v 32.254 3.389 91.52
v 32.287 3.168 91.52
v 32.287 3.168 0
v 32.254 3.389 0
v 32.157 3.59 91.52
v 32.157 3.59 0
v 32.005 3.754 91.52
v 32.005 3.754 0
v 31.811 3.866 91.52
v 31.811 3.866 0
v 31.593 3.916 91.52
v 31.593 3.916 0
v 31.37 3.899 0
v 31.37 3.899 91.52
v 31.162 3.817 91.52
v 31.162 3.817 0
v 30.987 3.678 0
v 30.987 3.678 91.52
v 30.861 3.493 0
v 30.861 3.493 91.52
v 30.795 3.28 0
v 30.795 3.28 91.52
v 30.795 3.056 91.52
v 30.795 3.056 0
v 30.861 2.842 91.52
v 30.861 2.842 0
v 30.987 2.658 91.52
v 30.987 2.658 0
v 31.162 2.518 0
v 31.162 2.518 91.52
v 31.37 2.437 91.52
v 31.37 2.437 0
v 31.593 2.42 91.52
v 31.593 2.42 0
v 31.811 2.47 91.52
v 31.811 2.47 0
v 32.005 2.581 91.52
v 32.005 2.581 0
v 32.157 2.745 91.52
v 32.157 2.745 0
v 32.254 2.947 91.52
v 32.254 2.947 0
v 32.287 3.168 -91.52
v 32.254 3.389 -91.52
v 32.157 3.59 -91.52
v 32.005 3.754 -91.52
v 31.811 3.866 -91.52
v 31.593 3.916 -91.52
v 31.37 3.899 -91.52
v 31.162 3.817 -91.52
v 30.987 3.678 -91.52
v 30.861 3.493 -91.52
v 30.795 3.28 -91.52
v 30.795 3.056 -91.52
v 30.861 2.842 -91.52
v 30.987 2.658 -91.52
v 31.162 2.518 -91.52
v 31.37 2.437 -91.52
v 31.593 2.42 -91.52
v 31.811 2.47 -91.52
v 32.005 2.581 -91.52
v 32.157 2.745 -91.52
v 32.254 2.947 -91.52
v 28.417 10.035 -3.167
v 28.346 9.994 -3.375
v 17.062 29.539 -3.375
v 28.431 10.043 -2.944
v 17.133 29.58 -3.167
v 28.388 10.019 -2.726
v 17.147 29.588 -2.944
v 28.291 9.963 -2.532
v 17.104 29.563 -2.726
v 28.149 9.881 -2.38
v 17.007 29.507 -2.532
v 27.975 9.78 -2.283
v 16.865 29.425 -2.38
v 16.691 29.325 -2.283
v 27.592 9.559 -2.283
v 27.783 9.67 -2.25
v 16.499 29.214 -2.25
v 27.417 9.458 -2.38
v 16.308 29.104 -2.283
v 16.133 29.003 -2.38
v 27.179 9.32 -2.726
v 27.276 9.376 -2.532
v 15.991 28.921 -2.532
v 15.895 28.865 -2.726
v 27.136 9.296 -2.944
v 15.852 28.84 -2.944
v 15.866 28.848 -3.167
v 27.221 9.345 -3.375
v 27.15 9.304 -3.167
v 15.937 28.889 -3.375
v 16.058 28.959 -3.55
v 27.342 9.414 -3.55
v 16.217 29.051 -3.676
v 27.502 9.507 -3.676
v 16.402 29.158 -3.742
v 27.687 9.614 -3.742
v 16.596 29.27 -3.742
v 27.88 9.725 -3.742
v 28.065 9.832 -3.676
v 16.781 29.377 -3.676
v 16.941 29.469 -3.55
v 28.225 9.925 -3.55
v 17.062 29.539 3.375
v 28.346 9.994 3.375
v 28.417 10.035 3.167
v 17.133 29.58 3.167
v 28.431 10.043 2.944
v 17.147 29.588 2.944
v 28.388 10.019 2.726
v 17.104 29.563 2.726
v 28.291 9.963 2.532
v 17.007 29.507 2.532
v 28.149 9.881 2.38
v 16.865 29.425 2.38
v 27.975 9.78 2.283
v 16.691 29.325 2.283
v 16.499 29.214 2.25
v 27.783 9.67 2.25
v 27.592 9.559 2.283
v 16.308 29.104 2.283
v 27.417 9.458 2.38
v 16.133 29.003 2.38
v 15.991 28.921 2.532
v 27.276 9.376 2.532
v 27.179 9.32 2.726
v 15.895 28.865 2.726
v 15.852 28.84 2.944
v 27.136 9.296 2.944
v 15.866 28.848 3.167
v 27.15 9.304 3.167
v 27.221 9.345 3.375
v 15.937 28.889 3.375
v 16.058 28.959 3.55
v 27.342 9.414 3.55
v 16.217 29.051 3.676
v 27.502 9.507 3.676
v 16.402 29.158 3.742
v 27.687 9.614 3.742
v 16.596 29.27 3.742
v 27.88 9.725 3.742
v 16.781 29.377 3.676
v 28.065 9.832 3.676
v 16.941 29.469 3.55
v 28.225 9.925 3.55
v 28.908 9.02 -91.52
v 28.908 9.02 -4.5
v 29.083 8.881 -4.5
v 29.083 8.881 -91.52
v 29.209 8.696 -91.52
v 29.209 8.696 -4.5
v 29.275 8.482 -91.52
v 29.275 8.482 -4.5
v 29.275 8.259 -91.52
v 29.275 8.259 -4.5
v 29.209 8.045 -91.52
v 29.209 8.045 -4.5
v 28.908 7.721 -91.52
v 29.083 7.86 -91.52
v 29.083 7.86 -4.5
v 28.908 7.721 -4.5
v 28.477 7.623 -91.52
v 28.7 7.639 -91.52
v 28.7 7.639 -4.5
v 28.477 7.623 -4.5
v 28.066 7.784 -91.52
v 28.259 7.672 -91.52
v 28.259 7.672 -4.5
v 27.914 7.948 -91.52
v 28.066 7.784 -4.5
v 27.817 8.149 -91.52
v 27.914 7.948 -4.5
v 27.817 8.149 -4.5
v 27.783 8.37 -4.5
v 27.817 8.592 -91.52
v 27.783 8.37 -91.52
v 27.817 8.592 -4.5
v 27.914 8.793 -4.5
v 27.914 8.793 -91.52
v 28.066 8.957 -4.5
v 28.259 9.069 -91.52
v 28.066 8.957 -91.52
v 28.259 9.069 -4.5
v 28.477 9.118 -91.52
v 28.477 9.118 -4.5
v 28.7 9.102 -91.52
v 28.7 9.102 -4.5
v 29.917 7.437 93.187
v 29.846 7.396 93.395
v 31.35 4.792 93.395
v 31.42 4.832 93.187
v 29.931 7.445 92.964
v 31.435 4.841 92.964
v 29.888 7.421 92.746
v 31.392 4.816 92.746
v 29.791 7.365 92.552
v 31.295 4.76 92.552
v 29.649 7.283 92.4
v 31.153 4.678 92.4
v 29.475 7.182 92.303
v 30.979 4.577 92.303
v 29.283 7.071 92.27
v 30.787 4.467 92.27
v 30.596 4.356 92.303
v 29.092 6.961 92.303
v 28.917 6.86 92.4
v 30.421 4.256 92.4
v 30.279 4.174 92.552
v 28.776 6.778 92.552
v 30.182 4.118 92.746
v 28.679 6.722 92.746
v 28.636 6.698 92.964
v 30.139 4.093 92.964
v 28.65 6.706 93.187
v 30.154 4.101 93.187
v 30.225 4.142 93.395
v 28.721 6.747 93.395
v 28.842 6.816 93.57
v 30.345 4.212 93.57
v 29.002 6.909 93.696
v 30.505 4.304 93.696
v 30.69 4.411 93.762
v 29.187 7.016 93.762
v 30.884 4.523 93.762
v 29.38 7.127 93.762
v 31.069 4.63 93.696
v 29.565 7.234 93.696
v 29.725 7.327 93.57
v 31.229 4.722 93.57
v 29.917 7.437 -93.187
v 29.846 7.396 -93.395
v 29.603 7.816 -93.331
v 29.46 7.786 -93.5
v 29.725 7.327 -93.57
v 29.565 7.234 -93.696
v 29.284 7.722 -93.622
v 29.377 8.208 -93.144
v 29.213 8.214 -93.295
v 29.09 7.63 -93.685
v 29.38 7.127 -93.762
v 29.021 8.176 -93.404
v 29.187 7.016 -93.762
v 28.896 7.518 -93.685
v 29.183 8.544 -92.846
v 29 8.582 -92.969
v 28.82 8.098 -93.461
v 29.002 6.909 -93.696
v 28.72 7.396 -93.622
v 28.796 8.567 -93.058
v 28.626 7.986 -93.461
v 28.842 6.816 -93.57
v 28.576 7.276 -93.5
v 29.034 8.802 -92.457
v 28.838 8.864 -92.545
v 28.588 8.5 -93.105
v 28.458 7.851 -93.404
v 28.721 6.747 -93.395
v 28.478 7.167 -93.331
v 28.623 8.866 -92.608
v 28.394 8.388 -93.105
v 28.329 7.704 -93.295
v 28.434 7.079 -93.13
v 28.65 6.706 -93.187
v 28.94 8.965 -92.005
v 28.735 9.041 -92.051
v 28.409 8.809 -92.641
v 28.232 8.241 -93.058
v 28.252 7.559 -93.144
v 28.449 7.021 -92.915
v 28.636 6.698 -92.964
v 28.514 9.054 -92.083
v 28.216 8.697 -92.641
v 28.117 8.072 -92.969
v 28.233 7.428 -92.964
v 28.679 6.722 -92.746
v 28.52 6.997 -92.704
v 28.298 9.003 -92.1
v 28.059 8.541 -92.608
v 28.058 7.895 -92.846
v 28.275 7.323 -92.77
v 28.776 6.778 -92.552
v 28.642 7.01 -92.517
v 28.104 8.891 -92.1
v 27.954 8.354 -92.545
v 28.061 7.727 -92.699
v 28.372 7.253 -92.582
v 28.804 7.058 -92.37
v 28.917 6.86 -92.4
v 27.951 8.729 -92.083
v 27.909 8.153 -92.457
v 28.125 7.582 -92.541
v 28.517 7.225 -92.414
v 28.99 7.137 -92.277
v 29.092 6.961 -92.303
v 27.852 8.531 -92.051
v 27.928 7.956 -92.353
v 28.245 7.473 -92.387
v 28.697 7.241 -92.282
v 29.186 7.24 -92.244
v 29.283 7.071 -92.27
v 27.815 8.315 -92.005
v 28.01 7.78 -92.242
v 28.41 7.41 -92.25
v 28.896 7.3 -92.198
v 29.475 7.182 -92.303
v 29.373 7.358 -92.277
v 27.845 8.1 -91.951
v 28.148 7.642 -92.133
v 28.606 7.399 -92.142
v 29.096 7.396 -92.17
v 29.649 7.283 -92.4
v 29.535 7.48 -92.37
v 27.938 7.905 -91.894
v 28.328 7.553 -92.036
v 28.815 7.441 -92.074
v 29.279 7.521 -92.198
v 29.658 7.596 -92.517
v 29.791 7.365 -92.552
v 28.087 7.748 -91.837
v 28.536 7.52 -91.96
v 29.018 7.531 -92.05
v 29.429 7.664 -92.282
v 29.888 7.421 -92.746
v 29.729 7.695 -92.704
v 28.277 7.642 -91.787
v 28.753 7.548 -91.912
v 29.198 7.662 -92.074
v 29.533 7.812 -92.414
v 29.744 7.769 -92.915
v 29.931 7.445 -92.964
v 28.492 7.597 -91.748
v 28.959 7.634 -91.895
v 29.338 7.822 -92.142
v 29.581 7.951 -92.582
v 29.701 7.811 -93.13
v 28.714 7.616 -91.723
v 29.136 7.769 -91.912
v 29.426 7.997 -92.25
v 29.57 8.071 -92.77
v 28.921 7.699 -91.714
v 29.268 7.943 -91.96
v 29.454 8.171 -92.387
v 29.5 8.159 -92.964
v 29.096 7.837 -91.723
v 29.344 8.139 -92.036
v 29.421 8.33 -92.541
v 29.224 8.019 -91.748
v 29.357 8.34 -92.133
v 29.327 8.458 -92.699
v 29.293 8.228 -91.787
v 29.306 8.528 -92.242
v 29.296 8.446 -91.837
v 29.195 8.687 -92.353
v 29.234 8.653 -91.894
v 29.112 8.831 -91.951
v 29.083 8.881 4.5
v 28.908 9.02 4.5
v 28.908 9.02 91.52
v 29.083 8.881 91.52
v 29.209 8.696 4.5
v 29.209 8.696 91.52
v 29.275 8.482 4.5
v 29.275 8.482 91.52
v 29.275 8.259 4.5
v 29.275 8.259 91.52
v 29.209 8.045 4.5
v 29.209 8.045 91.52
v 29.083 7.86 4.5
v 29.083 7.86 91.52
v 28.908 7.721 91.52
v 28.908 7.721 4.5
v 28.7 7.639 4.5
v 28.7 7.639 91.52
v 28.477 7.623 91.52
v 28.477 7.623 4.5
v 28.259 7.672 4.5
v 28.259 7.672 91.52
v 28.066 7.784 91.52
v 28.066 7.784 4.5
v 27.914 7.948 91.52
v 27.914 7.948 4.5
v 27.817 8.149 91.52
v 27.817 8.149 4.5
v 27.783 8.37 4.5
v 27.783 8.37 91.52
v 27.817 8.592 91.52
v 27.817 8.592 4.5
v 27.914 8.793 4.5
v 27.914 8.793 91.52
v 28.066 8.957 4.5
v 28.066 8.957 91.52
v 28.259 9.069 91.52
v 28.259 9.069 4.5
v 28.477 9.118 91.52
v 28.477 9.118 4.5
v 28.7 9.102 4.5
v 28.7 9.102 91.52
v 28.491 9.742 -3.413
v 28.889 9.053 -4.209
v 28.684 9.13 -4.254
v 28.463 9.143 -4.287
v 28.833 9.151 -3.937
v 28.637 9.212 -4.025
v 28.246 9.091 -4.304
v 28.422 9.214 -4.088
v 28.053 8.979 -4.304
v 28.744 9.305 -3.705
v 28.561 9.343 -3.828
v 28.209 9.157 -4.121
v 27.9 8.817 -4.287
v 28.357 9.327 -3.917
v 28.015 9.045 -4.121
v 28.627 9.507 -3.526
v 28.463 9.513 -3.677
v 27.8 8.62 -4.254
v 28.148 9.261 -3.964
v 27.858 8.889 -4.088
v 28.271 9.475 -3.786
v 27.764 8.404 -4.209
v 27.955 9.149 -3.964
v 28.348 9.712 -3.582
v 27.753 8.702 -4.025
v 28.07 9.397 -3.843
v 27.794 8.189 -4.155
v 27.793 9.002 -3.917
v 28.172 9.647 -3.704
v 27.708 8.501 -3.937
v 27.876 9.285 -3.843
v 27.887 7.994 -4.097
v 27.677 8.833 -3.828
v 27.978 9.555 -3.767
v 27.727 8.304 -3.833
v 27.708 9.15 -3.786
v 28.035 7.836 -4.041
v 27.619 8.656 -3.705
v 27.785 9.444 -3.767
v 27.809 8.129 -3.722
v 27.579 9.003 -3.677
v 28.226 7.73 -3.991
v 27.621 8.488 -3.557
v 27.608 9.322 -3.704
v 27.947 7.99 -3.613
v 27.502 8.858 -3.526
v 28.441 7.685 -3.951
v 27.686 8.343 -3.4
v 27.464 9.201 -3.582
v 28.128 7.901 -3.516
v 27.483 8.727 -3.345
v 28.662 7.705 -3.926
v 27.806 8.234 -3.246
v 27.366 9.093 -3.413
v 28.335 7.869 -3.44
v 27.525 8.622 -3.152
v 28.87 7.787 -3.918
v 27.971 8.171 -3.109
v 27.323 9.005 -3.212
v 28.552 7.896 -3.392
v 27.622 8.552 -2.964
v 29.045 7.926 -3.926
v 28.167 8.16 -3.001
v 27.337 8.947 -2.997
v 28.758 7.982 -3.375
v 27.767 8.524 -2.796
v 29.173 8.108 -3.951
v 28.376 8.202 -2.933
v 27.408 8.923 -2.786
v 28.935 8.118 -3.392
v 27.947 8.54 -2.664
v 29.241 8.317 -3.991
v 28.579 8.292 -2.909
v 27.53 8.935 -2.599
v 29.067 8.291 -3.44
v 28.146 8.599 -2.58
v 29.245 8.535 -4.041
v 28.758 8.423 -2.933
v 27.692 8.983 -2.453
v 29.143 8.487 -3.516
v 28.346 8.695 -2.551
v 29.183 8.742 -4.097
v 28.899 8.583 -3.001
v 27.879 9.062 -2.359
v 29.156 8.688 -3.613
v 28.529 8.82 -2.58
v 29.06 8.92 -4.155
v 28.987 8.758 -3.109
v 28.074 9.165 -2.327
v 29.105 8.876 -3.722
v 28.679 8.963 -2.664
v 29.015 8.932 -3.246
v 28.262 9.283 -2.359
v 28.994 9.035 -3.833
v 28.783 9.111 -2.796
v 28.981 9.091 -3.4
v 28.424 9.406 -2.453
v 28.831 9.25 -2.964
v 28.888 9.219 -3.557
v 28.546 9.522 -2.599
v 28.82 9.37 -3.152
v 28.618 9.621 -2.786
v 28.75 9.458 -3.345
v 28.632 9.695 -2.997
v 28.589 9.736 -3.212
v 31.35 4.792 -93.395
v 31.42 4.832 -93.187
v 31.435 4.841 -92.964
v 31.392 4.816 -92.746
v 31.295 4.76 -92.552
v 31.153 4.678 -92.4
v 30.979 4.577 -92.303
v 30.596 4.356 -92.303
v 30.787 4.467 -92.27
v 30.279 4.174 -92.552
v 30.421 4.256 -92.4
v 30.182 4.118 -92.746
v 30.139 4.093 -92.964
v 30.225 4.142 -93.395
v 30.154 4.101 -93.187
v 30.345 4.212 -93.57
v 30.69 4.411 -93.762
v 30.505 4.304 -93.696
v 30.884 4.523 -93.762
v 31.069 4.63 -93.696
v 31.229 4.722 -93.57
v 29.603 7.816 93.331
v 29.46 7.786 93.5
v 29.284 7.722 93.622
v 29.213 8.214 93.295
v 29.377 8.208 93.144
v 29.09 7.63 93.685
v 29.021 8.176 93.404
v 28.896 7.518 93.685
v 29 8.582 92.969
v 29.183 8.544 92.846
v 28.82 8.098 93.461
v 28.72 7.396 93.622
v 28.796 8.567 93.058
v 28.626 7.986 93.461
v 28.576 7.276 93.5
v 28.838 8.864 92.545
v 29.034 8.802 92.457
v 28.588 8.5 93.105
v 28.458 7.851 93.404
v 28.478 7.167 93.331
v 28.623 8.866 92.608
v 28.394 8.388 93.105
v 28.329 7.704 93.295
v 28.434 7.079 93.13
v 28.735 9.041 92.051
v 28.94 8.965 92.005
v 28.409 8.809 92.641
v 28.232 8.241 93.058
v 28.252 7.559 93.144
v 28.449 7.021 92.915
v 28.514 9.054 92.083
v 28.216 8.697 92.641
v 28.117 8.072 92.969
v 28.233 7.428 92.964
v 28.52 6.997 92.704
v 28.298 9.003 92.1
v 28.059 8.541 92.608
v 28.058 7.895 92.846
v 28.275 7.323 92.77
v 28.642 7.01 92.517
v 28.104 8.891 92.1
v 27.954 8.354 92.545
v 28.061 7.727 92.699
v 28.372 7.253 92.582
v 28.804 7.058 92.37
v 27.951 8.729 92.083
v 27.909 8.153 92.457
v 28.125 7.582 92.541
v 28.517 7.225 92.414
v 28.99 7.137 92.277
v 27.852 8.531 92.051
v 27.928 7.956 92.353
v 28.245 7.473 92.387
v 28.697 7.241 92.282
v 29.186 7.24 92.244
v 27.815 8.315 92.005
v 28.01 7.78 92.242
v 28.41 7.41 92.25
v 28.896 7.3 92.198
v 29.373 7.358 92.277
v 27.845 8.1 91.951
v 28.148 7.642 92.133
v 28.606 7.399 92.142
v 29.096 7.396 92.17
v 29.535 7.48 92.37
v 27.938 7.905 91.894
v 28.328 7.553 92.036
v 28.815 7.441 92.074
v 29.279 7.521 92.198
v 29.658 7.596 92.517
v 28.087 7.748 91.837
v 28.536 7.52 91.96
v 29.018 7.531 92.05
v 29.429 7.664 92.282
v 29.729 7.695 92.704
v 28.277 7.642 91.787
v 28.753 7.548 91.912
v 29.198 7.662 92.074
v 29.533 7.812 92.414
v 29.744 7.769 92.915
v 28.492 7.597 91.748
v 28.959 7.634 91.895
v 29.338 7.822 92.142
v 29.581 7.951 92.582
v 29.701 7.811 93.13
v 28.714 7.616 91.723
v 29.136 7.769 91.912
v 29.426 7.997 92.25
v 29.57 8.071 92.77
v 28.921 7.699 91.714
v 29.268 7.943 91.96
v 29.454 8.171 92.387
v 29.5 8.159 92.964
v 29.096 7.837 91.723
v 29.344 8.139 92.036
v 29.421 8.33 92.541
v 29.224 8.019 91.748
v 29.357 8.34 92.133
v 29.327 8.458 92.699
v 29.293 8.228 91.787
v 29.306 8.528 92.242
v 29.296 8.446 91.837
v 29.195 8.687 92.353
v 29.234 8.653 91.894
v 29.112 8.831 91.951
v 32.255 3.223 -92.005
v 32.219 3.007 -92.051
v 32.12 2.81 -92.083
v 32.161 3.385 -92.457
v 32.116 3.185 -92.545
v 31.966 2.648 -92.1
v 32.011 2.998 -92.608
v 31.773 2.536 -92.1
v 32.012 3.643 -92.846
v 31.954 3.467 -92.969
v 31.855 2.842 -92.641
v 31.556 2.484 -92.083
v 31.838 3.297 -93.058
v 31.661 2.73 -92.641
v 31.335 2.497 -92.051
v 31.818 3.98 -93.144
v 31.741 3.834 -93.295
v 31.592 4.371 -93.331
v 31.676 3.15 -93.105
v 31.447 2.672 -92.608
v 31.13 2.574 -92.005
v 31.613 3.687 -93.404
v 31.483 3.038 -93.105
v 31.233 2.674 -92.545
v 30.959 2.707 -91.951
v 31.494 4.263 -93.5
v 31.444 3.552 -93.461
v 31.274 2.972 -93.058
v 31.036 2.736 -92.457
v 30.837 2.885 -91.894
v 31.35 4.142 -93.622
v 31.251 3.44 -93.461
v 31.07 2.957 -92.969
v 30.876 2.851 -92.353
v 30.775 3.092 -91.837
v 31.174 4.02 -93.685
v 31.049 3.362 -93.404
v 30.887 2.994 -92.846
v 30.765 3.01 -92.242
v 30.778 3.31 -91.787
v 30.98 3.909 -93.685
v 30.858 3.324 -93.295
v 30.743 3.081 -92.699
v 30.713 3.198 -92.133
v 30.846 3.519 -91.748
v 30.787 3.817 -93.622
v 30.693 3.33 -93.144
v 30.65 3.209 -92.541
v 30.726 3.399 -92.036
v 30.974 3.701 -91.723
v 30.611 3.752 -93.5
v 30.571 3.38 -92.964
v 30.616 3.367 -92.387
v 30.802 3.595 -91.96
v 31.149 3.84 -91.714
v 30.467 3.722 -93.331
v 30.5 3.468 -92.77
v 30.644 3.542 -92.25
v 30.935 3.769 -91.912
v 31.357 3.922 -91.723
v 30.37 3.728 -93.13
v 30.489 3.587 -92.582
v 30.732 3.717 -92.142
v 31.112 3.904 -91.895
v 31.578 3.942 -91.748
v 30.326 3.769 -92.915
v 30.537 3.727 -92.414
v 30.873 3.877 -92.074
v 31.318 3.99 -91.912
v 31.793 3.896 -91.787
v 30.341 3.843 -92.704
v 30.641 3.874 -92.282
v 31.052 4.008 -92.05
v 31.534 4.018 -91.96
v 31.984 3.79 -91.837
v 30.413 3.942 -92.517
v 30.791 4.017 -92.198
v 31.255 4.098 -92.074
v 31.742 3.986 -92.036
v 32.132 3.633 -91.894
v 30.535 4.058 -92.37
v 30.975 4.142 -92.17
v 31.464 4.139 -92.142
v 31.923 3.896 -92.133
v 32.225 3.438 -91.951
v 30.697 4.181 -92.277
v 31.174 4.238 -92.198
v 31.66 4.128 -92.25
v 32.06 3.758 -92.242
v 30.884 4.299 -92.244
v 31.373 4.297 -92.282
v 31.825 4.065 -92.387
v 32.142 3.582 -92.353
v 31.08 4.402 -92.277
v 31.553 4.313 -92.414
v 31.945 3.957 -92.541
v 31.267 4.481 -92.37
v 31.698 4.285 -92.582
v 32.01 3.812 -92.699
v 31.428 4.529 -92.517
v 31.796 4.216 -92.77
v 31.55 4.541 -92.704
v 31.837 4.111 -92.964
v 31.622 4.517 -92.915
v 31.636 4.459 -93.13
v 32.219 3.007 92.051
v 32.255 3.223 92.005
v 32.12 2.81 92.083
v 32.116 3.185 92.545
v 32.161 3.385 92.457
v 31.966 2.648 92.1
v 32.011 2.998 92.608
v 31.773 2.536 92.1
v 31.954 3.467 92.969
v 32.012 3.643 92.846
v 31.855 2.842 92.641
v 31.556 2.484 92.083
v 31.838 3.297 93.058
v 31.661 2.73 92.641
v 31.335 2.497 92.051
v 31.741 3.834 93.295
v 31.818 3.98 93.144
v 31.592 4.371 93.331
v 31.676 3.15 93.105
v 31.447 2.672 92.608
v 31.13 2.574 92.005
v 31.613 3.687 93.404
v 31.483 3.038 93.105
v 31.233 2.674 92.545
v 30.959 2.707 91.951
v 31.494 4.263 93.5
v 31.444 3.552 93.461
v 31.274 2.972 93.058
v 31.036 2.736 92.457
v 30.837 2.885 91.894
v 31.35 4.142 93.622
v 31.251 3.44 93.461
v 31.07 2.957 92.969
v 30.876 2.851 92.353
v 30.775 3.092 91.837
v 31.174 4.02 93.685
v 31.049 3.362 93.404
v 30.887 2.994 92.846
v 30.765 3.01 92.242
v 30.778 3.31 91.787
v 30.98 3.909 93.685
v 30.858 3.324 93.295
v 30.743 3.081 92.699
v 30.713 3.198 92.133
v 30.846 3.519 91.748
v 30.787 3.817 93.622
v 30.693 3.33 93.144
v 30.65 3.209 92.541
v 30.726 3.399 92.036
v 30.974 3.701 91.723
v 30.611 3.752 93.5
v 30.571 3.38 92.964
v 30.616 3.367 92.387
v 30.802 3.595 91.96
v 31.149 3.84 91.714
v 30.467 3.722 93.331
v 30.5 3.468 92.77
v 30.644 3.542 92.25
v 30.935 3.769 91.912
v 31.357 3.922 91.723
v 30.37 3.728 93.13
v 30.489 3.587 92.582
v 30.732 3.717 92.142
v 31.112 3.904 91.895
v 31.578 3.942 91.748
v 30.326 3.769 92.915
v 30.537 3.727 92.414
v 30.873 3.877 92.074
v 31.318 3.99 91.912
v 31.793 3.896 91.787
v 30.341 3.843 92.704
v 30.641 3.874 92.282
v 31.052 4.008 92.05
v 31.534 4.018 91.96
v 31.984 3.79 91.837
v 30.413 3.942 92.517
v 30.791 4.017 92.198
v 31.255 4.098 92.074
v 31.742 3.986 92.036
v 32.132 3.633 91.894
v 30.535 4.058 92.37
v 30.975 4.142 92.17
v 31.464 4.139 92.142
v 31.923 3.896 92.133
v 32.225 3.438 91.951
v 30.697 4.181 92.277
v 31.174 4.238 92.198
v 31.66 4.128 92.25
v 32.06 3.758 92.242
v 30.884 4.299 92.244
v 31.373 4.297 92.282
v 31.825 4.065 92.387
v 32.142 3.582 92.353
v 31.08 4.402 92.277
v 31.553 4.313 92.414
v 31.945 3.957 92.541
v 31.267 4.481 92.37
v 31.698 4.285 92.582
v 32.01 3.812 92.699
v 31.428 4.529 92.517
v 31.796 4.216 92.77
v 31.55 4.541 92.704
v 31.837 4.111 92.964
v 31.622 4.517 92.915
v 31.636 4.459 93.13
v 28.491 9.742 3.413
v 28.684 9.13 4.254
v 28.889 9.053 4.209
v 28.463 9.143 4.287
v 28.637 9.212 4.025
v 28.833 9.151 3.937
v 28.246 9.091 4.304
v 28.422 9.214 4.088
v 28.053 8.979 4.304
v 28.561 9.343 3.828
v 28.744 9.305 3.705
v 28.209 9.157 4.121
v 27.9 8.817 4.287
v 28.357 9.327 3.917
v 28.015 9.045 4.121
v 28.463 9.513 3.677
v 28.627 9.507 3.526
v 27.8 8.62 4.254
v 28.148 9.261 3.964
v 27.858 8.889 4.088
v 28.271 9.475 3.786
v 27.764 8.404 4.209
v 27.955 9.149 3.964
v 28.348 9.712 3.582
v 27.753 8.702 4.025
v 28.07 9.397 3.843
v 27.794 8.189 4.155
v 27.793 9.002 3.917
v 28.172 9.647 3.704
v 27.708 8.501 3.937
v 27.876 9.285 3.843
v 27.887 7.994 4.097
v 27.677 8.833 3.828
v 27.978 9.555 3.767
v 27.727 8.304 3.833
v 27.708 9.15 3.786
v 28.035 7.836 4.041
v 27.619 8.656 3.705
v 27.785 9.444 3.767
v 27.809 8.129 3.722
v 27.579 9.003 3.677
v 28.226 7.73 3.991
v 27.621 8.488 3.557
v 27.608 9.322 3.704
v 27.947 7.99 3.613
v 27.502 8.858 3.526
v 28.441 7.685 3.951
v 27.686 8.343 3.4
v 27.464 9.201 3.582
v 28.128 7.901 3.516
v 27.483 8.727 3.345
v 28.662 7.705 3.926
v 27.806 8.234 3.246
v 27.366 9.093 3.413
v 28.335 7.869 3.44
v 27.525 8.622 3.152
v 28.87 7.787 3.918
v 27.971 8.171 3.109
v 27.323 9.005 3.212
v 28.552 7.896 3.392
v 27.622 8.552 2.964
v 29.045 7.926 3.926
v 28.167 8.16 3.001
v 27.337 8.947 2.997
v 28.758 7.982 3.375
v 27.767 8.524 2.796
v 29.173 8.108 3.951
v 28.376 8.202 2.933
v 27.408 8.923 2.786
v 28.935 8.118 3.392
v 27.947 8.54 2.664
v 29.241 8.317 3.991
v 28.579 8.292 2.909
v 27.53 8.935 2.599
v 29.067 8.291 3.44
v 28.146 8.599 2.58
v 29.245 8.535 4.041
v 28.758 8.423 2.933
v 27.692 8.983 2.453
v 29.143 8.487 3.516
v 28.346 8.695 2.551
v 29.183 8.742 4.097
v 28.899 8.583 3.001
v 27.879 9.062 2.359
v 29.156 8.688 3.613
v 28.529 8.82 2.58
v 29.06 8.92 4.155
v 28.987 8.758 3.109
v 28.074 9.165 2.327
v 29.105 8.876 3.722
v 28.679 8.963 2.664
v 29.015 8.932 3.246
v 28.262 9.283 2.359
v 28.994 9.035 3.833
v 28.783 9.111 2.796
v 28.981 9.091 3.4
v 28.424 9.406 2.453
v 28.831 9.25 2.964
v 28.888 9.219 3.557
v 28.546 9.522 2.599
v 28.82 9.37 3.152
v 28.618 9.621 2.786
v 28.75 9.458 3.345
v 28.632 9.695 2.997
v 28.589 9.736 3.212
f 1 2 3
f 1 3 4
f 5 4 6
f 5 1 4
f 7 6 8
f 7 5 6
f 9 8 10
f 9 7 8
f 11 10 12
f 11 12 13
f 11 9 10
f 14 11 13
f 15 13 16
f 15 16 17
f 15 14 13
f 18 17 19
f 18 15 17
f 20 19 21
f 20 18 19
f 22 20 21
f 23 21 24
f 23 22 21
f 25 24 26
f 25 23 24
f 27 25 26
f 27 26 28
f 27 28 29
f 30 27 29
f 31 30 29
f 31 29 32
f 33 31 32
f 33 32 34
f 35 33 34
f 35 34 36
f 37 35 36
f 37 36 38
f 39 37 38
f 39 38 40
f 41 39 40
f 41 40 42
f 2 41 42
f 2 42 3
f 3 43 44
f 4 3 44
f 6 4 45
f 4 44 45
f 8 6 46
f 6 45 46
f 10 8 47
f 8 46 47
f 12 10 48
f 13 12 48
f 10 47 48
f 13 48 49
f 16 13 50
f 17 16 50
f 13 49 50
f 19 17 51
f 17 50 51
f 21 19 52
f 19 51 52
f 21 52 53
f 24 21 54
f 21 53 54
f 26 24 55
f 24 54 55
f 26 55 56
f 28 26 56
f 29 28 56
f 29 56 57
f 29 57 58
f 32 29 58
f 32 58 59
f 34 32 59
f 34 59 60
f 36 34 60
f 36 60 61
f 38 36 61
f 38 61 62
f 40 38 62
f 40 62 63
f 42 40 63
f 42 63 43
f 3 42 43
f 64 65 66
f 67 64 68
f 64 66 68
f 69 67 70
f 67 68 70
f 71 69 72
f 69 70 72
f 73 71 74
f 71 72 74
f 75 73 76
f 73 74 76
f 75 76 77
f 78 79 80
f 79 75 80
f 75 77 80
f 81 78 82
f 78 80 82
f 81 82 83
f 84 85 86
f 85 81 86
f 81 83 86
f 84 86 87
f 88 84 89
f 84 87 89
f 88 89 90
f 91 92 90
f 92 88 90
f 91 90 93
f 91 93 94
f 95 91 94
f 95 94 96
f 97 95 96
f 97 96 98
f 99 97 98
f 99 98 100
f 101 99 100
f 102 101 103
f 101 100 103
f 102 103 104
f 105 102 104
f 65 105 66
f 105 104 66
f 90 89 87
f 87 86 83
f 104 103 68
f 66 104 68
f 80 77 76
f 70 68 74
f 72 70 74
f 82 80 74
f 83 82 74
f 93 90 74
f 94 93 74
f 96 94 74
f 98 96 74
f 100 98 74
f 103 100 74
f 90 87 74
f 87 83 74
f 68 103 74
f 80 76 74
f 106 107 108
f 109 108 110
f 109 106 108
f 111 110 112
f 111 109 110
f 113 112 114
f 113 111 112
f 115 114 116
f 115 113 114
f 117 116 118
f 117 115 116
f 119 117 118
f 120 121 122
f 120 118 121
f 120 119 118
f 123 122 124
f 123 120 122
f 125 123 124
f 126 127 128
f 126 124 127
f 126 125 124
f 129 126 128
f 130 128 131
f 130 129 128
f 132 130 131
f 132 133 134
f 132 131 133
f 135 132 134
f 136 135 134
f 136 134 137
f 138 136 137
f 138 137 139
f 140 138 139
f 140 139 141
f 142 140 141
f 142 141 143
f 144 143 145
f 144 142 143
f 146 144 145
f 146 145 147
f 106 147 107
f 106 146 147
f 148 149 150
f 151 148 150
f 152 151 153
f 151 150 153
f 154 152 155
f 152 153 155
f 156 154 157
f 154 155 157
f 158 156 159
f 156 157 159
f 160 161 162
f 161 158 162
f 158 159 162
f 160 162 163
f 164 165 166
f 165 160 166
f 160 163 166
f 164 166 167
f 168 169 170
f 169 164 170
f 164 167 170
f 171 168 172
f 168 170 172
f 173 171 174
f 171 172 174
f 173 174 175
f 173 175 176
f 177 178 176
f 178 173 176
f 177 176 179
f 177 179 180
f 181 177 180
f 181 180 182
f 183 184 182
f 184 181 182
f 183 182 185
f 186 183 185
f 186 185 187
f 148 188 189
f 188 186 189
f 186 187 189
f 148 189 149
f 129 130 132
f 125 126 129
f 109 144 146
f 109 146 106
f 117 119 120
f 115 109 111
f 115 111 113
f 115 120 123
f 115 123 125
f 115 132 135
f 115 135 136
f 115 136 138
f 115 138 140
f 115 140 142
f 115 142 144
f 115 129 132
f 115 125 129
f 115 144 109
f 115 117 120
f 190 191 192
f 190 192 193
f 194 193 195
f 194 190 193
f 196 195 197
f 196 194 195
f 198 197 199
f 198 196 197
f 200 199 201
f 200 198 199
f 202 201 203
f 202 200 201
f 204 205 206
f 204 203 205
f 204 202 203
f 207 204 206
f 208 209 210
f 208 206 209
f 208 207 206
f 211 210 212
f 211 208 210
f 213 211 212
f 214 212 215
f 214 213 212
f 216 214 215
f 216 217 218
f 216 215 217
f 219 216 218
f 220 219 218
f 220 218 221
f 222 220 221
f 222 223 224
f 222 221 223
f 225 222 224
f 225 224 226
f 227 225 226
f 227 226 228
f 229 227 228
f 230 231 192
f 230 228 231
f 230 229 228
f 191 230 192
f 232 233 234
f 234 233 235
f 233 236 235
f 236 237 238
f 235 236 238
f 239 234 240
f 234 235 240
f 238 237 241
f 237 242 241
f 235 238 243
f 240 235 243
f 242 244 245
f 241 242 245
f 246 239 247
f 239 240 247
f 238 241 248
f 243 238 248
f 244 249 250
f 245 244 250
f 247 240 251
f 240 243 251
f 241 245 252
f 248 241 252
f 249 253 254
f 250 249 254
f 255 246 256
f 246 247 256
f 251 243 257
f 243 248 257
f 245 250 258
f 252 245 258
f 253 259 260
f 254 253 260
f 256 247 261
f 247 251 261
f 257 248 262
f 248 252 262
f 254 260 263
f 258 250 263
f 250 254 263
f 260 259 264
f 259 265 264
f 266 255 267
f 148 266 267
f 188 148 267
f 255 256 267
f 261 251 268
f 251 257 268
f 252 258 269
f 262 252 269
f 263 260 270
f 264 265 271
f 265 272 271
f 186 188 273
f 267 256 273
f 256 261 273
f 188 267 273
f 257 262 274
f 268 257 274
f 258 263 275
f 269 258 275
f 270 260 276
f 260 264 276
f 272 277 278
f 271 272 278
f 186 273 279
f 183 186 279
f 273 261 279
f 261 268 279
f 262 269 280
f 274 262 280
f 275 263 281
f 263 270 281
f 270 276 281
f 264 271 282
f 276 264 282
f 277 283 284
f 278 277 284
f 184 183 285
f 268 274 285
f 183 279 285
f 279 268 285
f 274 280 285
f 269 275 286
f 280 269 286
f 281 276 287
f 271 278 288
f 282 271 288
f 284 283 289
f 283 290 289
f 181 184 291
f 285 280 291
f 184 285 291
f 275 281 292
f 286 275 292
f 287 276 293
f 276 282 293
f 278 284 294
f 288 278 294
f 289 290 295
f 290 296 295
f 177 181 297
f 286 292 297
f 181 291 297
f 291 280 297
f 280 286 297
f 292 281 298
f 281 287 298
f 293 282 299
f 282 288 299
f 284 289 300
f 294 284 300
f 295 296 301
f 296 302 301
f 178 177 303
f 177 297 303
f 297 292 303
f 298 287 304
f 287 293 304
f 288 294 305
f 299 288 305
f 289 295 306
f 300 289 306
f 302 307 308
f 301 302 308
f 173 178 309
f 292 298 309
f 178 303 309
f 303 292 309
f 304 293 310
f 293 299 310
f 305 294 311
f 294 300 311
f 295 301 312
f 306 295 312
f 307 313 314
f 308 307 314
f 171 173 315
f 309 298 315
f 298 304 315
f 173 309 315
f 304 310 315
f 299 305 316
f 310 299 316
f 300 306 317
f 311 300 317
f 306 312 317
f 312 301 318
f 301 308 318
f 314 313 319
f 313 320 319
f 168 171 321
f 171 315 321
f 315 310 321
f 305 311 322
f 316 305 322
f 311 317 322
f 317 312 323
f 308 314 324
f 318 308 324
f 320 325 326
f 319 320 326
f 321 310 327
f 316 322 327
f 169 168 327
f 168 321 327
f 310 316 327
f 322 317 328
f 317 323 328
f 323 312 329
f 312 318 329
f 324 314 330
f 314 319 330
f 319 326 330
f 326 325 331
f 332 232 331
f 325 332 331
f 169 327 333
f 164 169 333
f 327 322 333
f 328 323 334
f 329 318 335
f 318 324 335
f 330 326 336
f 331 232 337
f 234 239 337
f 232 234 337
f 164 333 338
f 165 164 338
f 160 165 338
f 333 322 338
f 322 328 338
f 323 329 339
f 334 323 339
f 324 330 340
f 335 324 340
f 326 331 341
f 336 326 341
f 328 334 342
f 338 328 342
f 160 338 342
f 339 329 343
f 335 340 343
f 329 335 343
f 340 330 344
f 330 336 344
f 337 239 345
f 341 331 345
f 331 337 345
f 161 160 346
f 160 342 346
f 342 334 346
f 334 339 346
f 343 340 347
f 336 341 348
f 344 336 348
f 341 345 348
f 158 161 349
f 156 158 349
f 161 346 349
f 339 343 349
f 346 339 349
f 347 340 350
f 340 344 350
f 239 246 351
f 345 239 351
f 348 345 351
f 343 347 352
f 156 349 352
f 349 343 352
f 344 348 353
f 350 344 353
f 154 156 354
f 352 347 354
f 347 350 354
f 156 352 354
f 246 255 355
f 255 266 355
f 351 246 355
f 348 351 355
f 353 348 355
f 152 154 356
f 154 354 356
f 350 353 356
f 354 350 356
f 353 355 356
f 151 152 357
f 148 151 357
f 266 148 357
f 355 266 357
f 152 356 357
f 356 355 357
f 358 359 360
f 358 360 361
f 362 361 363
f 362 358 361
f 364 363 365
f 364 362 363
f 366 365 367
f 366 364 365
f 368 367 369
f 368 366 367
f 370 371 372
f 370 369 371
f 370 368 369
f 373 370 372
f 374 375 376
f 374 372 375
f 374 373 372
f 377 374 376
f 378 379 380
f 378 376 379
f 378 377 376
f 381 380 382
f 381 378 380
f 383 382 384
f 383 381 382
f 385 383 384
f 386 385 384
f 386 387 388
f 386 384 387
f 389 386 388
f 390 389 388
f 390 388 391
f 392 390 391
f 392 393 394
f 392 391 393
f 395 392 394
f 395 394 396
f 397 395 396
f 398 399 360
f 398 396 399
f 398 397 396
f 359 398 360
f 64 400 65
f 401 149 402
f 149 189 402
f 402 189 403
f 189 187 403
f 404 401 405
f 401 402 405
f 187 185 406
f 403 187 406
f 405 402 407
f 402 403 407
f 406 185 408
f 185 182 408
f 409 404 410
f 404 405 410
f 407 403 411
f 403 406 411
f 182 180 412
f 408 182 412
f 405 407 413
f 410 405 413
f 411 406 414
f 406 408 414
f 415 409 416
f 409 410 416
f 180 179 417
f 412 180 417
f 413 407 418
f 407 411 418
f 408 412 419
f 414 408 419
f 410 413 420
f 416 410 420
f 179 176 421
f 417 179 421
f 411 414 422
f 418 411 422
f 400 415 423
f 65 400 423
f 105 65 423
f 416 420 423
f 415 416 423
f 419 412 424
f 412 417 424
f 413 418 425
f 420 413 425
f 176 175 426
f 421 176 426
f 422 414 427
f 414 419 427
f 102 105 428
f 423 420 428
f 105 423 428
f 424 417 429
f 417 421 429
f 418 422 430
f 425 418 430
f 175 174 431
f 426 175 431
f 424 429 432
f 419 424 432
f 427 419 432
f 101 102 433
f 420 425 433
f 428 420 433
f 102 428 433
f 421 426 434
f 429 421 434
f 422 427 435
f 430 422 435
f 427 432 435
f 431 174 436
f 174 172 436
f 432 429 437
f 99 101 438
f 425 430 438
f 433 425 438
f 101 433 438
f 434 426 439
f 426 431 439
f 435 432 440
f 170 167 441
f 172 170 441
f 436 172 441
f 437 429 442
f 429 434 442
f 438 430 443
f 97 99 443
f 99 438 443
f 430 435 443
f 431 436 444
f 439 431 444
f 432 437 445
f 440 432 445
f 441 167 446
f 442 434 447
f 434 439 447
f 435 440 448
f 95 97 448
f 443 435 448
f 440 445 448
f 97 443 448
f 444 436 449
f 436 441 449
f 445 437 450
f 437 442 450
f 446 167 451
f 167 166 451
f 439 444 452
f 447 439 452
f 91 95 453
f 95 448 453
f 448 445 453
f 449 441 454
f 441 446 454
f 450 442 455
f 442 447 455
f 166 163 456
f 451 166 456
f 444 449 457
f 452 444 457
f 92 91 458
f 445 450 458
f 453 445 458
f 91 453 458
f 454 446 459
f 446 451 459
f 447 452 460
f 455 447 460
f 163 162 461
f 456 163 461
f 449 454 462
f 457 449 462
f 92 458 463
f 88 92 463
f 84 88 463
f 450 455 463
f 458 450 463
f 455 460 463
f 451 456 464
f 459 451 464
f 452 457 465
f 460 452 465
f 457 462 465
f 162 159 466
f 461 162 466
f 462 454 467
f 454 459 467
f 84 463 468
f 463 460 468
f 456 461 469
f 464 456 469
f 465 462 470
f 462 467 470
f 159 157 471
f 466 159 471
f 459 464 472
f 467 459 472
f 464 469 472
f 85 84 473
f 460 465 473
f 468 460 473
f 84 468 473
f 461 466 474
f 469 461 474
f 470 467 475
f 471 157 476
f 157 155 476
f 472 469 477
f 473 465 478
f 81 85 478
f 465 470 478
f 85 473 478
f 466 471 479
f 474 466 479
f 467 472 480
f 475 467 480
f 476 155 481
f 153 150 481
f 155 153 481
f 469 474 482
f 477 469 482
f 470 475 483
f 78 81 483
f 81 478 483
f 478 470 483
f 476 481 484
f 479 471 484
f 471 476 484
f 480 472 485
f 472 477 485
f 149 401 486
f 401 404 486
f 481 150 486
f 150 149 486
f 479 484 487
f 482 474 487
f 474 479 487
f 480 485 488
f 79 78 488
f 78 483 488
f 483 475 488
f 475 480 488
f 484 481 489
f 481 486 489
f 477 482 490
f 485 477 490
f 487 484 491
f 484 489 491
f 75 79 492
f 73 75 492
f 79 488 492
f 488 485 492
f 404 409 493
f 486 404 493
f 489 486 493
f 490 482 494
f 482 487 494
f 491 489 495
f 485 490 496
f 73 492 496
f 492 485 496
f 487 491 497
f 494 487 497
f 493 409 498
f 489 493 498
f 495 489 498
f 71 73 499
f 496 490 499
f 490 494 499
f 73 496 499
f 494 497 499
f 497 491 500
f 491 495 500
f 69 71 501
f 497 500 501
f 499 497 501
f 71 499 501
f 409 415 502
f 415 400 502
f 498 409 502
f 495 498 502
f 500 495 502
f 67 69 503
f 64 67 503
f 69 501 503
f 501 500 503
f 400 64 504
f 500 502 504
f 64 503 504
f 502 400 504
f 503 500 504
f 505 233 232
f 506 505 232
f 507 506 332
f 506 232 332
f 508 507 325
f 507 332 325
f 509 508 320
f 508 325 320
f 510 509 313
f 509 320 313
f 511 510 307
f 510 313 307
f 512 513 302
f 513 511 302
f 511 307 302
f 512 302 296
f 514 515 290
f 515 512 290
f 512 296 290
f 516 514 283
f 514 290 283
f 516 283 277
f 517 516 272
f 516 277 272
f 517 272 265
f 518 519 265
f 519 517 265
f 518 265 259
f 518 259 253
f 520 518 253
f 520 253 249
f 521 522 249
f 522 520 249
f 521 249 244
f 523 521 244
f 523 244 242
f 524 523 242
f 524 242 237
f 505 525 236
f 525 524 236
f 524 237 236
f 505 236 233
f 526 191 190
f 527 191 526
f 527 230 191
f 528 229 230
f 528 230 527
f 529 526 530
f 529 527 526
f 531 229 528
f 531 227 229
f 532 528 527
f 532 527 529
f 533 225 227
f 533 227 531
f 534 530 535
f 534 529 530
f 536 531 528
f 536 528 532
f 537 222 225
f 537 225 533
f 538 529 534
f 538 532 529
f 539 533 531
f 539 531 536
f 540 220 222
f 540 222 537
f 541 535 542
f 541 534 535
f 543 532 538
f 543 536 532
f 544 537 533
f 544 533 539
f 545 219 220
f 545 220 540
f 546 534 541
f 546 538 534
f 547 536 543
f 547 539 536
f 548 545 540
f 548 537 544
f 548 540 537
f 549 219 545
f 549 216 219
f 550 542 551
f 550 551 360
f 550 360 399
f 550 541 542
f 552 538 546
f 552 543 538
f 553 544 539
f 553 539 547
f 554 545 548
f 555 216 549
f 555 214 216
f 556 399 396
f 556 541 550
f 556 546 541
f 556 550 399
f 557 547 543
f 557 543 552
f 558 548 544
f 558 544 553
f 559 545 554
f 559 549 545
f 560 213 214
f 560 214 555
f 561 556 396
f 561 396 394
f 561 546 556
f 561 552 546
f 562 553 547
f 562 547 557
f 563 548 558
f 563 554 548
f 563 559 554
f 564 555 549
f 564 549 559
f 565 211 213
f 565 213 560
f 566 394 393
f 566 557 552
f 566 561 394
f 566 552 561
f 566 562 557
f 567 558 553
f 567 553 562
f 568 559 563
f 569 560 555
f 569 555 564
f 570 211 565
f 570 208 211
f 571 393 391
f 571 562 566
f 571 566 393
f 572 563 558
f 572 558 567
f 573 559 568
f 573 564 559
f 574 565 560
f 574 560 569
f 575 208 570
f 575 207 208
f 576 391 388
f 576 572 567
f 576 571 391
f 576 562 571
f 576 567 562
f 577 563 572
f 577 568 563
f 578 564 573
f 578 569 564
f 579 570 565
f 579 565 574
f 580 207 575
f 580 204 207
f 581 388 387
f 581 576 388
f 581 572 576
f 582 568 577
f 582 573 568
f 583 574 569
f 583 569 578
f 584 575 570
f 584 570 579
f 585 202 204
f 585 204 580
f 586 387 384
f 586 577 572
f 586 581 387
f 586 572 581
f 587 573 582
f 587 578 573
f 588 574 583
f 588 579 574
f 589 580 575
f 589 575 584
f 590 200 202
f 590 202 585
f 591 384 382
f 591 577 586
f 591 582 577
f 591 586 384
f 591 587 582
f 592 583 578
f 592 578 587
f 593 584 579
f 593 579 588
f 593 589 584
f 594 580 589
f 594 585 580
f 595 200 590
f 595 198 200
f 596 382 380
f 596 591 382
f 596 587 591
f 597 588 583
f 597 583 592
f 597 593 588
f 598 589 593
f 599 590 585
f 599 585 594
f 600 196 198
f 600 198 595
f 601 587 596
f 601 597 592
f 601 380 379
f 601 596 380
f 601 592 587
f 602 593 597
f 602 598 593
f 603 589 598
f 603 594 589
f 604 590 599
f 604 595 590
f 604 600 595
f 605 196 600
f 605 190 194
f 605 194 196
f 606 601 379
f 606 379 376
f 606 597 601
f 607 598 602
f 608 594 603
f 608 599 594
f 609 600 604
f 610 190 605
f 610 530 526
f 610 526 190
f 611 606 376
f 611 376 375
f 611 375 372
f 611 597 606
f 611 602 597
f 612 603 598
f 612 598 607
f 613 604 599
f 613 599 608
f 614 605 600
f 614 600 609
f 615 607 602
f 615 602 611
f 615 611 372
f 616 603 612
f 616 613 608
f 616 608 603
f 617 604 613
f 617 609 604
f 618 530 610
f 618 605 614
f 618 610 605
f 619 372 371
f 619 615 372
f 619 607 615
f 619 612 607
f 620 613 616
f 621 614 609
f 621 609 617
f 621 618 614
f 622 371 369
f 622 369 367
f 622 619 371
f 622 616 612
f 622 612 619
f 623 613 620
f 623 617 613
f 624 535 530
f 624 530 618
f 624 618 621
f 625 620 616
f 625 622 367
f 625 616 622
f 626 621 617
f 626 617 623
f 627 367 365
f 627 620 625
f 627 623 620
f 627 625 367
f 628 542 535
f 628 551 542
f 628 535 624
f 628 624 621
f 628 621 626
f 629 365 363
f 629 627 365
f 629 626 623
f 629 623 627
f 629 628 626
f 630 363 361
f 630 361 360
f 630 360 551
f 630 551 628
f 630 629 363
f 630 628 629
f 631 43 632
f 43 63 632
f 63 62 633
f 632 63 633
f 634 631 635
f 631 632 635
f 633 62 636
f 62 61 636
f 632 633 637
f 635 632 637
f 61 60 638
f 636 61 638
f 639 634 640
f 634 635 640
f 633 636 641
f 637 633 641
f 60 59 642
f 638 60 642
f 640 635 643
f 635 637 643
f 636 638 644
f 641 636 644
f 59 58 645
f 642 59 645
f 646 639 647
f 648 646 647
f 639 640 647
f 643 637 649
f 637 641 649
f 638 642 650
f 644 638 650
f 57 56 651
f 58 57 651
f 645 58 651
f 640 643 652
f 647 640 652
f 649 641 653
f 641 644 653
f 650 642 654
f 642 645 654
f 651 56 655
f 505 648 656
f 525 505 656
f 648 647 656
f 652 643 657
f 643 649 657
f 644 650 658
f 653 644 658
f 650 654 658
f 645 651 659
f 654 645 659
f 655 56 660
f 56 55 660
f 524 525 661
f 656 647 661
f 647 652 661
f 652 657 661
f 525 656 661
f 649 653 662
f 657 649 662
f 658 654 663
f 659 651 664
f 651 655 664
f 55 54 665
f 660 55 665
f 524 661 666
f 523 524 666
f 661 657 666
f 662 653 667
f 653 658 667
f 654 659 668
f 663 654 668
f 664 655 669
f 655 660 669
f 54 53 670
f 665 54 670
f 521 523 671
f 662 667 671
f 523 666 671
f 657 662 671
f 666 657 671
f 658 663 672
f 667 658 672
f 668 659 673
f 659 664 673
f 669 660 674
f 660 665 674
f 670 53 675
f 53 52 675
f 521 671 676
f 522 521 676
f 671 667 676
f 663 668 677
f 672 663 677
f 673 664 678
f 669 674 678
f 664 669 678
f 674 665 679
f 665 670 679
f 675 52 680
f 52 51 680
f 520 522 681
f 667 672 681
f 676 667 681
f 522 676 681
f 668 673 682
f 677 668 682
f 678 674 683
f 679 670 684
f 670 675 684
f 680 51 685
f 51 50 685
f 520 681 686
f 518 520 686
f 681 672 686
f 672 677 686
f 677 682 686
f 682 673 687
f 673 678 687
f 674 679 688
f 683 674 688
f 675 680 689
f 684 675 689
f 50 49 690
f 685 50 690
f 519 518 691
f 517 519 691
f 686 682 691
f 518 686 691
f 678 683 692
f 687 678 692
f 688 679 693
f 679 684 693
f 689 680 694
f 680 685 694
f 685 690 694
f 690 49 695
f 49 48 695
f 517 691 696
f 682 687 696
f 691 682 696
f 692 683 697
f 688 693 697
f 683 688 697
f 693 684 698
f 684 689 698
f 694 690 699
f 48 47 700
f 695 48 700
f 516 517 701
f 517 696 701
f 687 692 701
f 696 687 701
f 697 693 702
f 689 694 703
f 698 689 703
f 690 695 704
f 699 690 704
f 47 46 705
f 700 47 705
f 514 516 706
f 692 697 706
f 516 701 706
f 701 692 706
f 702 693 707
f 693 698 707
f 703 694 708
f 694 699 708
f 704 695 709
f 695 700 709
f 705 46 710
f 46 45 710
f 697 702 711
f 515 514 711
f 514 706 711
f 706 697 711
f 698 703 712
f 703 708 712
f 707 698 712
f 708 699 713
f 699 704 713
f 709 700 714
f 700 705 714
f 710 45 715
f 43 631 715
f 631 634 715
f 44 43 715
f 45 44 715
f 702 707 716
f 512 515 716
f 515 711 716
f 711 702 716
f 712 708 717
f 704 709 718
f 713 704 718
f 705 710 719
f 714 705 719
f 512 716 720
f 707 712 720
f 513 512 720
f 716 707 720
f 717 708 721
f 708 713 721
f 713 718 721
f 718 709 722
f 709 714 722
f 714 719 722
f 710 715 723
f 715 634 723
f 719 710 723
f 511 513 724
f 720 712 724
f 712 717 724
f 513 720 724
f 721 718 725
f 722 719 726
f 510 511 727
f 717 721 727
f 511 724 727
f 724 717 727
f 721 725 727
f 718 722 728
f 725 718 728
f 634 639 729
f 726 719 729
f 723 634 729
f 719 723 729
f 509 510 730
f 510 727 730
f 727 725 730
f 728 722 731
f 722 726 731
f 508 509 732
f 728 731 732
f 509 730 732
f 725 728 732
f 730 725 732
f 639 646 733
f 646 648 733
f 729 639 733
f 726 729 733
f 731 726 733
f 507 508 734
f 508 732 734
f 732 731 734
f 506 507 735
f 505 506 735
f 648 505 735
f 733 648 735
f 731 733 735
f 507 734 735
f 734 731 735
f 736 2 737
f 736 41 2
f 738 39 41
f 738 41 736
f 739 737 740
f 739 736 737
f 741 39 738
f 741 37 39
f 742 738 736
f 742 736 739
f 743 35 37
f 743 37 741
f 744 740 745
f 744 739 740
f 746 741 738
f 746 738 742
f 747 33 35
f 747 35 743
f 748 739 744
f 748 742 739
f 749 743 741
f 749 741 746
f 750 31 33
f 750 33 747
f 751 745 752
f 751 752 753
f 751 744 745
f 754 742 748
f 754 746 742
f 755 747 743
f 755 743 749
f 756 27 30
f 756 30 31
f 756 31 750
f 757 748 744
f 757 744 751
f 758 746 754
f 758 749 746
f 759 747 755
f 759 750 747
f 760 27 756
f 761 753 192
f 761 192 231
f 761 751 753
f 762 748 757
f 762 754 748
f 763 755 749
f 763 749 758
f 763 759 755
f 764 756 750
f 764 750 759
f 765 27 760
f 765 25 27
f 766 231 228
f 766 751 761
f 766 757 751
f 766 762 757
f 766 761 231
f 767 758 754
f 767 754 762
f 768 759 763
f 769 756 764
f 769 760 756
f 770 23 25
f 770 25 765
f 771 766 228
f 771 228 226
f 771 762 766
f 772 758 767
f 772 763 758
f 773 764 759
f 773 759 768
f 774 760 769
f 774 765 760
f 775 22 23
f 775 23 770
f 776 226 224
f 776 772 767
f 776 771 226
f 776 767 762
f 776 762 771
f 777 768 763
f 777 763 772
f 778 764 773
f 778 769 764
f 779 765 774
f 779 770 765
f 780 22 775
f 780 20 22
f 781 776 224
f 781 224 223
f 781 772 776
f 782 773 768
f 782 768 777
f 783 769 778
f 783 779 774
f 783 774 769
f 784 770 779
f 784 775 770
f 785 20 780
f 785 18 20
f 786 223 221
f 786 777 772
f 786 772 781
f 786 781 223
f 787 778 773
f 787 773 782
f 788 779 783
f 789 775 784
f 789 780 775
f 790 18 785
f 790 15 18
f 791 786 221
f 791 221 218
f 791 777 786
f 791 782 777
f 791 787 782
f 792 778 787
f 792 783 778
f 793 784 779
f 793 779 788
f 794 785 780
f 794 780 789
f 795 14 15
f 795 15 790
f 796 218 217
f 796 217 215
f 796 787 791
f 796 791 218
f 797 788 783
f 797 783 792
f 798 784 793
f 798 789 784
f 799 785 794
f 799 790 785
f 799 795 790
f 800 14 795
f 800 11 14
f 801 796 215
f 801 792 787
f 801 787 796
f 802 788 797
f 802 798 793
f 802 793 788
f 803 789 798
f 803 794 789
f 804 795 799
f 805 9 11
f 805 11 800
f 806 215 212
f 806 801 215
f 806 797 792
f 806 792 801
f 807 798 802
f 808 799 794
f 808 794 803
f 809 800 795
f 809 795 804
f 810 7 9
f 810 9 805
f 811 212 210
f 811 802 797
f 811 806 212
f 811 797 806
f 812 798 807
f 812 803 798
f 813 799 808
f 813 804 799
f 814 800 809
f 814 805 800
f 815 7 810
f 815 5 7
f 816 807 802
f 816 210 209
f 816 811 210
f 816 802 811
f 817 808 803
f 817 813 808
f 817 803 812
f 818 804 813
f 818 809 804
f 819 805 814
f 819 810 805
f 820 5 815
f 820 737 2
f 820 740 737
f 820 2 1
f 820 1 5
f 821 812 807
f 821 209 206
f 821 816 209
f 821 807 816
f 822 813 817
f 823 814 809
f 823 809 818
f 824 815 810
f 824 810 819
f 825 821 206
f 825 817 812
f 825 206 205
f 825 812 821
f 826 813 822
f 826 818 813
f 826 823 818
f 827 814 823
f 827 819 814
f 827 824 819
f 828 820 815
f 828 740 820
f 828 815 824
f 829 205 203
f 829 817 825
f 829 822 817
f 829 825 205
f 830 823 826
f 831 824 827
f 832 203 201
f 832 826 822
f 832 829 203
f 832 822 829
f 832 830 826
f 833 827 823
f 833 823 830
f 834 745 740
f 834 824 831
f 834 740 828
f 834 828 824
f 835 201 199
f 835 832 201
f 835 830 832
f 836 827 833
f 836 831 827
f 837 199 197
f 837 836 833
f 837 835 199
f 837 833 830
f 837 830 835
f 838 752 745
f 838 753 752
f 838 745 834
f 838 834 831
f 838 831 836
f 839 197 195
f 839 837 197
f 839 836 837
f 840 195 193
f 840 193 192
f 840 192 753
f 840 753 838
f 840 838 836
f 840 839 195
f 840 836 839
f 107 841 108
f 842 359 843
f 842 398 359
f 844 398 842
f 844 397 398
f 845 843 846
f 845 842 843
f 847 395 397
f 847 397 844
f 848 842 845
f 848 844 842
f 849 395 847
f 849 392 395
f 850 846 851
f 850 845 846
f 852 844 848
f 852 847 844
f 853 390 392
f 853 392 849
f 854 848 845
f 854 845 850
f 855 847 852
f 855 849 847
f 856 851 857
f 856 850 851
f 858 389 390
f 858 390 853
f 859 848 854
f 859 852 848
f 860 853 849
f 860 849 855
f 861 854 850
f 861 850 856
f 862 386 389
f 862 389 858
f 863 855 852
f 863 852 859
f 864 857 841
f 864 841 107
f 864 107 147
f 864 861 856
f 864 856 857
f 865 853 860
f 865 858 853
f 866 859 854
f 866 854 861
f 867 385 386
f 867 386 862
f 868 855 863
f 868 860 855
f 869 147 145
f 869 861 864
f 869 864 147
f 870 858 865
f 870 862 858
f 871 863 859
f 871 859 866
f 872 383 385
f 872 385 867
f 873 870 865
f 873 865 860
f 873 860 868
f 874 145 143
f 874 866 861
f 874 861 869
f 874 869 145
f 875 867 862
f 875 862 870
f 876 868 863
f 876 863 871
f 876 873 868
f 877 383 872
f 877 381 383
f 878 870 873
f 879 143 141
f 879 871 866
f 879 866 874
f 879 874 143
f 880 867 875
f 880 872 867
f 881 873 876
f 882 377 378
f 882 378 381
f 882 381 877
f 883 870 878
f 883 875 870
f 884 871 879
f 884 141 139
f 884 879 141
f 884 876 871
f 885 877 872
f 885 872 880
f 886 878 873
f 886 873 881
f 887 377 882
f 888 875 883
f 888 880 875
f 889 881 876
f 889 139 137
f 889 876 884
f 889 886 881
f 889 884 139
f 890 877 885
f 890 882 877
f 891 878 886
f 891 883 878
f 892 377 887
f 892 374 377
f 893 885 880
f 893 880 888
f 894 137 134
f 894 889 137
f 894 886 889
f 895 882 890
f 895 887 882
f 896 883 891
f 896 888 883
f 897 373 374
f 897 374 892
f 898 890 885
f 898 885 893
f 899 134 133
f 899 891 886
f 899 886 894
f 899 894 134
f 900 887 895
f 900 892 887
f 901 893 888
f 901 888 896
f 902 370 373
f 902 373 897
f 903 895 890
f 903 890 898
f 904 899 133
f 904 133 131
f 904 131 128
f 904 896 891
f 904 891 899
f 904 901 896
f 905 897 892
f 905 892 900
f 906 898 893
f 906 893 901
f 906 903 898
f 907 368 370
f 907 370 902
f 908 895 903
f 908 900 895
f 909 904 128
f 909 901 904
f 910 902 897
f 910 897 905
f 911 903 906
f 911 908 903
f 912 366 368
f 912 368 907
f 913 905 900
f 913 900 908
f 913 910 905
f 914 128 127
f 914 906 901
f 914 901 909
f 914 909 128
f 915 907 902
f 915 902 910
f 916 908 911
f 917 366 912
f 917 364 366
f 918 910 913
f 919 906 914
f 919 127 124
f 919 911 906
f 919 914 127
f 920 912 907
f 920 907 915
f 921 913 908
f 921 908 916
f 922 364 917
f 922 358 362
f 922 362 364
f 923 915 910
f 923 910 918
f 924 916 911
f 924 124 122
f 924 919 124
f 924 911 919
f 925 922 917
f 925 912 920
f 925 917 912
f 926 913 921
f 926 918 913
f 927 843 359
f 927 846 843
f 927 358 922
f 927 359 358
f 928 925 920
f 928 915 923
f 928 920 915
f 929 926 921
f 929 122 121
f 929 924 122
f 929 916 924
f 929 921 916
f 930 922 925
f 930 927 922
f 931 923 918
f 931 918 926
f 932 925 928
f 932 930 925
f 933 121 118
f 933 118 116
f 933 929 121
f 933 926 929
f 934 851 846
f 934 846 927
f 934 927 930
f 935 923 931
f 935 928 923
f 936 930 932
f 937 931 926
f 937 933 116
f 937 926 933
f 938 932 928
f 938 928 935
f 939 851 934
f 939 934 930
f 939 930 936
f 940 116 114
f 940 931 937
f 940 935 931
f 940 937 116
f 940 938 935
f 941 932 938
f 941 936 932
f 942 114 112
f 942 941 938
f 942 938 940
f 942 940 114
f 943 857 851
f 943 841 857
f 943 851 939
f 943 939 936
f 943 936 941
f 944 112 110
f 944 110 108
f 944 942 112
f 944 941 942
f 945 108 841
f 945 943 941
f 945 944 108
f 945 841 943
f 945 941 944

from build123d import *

# Parameters (mm, degrees)
SKETCH1_R = 0.75


with BuildPart() as part:
    # Sweep1: sweep along a path in Sketch2
    with BuildLine(Plane(origin=(25.024519053, 14.447912811, -100.982075021), x_dir=(0.5, -0.866025404, 0), z_dir=(-0.866025404, -0.5, 0))) as sweep1_path:
        Line((13.025079587, 100.982075021), (13.025079587, 192.502075021))
        ThreePointArc((13.025079587, 192.502075021), (12.585739759, 193.562735193), (11.525079587, 194.002075021))
        Line((11.525079587, 194.002075021), (8.517595341, 194.002075021))
        ThreePointArc((8.517595341, 194.002075021), (7.456935169, 193.562735193), (7.017595341, 192.502075021))
        Line((7.017595341, 192.502075021), (7.017595341, 105.482075021))
        ThreePointArc((7.017595341, 105.482075021), (6.578255513, 104.421414849), (5.517595341, 103.982075021))
        Line((5.517595341, 103.982075021), (-17.050460117, 103.982075021))
    # Sketch1 → Sweep1 (sweep)
    with BuildSketch(Plane.XY):
        with Locations((31.537058846, 3.167863003)):
            Circle(SKETCH1_R)
    sweep1 = sweep(path=sweep1_path.line)

    # Mirror1: Sweep1 across plane
    add(sweep1.mirror(Plane.XY))


solid = part.part
